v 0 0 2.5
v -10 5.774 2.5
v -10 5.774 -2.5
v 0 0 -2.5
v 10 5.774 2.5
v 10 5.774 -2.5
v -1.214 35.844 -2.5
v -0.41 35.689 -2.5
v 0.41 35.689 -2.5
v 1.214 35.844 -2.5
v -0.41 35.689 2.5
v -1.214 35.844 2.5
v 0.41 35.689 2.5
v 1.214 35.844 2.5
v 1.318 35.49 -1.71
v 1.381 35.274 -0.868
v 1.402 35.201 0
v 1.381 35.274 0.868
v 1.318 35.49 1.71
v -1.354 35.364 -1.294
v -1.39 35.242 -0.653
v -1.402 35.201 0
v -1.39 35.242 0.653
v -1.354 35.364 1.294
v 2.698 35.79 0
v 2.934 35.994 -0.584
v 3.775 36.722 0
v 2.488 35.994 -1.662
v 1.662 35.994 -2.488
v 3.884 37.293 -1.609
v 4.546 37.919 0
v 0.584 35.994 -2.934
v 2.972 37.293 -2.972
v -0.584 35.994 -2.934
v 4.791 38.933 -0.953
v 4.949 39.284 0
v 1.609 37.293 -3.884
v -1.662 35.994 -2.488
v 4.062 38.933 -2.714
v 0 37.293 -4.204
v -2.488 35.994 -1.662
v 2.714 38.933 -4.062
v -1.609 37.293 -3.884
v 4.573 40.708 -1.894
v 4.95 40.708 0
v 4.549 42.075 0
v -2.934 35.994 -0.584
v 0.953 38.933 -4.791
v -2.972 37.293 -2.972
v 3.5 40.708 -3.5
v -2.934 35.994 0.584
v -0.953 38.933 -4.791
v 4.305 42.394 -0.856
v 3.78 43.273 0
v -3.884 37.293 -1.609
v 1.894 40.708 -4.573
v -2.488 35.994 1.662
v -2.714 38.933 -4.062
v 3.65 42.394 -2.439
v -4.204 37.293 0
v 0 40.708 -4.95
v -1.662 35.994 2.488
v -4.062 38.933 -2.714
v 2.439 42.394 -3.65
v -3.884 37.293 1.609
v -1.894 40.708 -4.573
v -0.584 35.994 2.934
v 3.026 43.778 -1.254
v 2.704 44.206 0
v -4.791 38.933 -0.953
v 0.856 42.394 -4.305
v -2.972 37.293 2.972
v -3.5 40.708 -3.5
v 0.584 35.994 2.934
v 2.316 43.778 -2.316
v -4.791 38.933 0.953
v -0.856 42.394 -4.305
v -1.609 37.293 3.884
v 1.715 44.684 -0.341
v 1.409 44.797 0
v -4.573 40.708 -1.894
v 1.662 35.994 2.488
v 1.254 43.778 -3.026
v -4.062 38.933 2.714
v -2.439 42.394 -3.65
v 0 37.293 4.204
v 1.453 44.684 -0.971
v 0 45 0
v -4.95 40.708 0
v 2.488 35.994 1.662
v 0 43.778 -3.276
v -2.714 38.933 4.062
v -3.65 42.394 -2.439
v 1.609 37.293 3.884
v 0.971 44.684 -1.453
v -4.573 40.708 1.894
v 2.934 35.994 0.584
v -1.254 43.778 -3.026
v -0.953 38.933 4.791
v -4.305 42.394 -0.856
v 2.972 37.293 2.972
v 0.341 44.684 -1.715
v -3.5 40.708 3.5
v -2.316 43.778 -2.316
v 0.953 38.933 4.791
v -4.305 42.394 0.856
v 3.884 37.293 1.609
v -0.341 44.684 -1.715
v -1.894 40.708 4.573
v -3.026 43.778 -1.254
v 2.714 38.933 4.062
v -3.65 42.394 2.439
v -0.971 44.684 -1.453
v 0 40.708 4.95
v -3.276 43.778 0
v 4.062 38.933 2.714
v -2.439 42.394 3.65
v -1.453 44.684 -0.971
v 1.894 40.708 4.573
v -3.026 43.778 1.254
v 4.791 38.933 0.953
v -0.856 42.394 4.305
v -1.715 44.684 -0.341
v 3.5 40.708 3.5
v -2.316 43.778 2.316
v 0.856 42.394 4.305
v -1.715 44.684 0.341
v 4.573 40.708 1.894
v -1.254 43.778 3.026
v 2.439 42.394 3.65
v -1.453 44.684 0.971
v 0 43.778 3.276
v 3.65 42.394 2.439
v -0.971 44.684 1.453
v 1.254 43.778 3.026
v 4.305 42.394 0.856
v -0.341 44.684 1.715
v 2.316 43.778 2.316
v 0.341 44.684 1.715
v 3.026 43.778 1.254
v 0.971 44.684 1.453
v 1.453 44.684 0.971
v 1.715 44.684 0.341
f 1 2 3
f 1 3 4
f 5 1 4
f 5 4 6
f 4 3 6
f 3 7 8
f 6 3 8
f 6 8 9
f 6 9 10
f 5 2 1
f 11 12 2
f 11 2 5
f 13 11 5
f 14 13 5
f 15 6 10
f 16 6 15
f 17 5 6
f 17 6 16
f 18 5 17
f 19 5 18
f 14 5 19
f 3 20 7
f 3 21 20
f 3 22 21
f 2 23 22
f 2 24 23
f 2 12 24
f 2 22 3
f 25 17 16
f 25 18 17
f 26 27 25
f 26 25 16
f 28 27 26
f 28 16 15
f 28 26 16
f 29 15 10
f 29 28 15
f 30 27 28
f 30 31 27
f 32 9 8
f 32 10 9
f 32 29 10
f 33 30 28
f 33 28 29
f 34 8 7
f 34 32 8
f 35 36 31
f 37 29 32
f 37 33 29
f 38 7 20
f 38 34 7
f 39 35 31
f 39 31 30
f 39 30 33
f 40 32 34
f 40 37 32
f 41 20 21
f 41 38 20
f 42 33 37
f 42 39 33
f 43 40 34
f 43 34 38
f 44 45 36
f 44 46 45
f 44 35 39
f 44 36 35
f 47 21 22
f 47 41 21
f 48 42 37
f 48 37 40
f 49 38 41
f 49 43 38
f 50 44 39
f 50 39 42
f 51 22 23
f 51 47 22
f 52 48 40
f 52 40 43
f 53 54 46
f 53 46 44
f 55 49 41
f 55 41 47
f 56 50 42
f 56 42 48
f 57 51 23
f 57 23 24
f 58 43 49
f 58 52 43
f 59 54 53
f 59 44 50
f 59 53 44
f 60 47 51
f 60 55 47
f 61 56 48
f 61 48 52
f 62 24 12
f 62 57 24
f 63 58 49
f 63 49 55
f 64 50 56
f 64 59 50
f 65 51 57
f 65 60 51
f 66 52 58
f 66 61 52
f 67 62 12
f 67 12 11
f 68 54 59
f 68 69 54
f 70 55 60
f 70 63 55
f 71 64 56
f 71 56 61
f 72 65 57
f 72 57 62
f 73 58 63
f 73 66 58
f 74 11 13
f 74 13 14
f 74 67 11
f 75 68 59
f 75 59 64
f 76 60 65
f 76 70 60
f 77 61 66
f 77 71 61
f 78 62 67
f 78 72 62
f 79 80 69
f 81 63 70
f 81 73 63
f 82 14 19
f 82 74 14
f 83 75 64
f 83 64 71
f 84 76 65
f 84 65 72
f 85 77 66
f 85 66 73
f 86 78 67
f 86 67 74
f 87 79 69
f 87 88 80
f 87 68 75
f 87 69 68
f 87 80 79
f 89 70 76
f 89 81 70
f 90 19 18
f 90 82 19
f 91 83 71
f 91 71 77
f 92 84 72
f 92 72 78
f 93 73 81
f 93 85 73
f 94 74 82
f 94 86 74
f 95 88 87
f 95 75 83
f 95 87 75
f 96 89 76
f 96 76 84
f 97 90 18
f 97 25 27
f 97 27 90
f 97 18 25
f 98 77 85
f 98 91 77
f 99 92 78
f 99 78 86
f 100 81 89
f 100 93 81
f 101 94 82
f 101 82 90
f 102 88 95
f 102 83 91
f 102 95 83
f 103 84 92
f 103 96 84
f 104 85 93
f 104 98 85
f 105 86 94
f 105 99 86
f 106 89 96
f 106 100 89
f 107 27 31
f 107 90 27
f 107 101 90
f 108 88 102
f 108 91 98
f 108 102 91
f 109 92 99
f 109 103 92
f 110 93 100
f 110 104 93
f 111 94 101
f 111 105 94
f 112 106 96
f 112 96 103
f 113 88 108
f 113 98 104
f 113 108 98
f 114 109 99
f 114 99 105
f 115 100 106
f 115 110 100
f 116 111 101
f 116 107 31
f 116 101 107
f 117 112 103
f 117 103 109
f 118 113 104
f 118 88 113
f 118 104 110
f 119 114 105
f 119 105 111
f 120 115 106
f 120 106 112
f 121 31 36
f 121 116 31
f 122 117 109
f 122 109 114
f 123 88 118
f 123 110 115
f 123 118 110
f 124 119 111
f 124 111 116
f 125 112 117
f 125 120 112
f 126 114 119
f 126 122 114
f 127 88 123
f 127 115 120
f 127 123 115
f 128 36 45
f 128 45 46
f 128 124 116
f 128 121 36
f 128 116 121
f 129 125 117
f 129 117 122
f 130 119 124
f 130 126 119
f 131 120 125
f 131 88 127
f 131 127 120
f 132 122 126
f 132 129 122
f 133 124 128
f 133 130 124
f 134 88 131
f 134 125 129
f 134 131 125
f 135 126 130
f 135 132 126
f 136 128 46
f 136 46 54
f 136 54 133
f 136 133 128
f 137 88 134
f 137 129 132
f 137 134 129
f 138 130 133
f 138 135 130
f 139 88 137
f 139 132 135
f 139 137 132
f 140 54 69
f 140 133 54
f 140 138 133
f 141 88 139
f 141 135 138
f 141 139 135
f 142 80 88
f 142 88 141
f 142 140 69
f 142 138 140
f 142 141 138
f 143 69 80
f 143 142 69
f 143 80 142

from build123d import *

# Parameters (mm, degrees)
AUFSATZ_LINEAR_AUSTRAGEN1_DEPTH = 2.5


with BuildPart() as part:
    # Skizze1 → Rotation1 (revolve)
    with BuildSketch(Plane.XY):
        with BuildLine():
            Line((0, 45), (0, 35))
            ThreePointArc((0, 35), (5, 40), (0, 45))
        make_face()
    revolve(axis=Axis((0, 0, 0), (0, 1, 0)))

    # Skizze2 → Aufsatz-Linear austragen1 (add, symmetric)
    with BuildSketch(Plane.XY):
        Polygon((0, 40), (-10, 5.773502692), (0, 0), (10, 5.773502692), align=None)
    extrude(amount=AUFSATZ_LINEAR_AUSTRAGEN1_DEPTH, both=True)


solid = part.part
